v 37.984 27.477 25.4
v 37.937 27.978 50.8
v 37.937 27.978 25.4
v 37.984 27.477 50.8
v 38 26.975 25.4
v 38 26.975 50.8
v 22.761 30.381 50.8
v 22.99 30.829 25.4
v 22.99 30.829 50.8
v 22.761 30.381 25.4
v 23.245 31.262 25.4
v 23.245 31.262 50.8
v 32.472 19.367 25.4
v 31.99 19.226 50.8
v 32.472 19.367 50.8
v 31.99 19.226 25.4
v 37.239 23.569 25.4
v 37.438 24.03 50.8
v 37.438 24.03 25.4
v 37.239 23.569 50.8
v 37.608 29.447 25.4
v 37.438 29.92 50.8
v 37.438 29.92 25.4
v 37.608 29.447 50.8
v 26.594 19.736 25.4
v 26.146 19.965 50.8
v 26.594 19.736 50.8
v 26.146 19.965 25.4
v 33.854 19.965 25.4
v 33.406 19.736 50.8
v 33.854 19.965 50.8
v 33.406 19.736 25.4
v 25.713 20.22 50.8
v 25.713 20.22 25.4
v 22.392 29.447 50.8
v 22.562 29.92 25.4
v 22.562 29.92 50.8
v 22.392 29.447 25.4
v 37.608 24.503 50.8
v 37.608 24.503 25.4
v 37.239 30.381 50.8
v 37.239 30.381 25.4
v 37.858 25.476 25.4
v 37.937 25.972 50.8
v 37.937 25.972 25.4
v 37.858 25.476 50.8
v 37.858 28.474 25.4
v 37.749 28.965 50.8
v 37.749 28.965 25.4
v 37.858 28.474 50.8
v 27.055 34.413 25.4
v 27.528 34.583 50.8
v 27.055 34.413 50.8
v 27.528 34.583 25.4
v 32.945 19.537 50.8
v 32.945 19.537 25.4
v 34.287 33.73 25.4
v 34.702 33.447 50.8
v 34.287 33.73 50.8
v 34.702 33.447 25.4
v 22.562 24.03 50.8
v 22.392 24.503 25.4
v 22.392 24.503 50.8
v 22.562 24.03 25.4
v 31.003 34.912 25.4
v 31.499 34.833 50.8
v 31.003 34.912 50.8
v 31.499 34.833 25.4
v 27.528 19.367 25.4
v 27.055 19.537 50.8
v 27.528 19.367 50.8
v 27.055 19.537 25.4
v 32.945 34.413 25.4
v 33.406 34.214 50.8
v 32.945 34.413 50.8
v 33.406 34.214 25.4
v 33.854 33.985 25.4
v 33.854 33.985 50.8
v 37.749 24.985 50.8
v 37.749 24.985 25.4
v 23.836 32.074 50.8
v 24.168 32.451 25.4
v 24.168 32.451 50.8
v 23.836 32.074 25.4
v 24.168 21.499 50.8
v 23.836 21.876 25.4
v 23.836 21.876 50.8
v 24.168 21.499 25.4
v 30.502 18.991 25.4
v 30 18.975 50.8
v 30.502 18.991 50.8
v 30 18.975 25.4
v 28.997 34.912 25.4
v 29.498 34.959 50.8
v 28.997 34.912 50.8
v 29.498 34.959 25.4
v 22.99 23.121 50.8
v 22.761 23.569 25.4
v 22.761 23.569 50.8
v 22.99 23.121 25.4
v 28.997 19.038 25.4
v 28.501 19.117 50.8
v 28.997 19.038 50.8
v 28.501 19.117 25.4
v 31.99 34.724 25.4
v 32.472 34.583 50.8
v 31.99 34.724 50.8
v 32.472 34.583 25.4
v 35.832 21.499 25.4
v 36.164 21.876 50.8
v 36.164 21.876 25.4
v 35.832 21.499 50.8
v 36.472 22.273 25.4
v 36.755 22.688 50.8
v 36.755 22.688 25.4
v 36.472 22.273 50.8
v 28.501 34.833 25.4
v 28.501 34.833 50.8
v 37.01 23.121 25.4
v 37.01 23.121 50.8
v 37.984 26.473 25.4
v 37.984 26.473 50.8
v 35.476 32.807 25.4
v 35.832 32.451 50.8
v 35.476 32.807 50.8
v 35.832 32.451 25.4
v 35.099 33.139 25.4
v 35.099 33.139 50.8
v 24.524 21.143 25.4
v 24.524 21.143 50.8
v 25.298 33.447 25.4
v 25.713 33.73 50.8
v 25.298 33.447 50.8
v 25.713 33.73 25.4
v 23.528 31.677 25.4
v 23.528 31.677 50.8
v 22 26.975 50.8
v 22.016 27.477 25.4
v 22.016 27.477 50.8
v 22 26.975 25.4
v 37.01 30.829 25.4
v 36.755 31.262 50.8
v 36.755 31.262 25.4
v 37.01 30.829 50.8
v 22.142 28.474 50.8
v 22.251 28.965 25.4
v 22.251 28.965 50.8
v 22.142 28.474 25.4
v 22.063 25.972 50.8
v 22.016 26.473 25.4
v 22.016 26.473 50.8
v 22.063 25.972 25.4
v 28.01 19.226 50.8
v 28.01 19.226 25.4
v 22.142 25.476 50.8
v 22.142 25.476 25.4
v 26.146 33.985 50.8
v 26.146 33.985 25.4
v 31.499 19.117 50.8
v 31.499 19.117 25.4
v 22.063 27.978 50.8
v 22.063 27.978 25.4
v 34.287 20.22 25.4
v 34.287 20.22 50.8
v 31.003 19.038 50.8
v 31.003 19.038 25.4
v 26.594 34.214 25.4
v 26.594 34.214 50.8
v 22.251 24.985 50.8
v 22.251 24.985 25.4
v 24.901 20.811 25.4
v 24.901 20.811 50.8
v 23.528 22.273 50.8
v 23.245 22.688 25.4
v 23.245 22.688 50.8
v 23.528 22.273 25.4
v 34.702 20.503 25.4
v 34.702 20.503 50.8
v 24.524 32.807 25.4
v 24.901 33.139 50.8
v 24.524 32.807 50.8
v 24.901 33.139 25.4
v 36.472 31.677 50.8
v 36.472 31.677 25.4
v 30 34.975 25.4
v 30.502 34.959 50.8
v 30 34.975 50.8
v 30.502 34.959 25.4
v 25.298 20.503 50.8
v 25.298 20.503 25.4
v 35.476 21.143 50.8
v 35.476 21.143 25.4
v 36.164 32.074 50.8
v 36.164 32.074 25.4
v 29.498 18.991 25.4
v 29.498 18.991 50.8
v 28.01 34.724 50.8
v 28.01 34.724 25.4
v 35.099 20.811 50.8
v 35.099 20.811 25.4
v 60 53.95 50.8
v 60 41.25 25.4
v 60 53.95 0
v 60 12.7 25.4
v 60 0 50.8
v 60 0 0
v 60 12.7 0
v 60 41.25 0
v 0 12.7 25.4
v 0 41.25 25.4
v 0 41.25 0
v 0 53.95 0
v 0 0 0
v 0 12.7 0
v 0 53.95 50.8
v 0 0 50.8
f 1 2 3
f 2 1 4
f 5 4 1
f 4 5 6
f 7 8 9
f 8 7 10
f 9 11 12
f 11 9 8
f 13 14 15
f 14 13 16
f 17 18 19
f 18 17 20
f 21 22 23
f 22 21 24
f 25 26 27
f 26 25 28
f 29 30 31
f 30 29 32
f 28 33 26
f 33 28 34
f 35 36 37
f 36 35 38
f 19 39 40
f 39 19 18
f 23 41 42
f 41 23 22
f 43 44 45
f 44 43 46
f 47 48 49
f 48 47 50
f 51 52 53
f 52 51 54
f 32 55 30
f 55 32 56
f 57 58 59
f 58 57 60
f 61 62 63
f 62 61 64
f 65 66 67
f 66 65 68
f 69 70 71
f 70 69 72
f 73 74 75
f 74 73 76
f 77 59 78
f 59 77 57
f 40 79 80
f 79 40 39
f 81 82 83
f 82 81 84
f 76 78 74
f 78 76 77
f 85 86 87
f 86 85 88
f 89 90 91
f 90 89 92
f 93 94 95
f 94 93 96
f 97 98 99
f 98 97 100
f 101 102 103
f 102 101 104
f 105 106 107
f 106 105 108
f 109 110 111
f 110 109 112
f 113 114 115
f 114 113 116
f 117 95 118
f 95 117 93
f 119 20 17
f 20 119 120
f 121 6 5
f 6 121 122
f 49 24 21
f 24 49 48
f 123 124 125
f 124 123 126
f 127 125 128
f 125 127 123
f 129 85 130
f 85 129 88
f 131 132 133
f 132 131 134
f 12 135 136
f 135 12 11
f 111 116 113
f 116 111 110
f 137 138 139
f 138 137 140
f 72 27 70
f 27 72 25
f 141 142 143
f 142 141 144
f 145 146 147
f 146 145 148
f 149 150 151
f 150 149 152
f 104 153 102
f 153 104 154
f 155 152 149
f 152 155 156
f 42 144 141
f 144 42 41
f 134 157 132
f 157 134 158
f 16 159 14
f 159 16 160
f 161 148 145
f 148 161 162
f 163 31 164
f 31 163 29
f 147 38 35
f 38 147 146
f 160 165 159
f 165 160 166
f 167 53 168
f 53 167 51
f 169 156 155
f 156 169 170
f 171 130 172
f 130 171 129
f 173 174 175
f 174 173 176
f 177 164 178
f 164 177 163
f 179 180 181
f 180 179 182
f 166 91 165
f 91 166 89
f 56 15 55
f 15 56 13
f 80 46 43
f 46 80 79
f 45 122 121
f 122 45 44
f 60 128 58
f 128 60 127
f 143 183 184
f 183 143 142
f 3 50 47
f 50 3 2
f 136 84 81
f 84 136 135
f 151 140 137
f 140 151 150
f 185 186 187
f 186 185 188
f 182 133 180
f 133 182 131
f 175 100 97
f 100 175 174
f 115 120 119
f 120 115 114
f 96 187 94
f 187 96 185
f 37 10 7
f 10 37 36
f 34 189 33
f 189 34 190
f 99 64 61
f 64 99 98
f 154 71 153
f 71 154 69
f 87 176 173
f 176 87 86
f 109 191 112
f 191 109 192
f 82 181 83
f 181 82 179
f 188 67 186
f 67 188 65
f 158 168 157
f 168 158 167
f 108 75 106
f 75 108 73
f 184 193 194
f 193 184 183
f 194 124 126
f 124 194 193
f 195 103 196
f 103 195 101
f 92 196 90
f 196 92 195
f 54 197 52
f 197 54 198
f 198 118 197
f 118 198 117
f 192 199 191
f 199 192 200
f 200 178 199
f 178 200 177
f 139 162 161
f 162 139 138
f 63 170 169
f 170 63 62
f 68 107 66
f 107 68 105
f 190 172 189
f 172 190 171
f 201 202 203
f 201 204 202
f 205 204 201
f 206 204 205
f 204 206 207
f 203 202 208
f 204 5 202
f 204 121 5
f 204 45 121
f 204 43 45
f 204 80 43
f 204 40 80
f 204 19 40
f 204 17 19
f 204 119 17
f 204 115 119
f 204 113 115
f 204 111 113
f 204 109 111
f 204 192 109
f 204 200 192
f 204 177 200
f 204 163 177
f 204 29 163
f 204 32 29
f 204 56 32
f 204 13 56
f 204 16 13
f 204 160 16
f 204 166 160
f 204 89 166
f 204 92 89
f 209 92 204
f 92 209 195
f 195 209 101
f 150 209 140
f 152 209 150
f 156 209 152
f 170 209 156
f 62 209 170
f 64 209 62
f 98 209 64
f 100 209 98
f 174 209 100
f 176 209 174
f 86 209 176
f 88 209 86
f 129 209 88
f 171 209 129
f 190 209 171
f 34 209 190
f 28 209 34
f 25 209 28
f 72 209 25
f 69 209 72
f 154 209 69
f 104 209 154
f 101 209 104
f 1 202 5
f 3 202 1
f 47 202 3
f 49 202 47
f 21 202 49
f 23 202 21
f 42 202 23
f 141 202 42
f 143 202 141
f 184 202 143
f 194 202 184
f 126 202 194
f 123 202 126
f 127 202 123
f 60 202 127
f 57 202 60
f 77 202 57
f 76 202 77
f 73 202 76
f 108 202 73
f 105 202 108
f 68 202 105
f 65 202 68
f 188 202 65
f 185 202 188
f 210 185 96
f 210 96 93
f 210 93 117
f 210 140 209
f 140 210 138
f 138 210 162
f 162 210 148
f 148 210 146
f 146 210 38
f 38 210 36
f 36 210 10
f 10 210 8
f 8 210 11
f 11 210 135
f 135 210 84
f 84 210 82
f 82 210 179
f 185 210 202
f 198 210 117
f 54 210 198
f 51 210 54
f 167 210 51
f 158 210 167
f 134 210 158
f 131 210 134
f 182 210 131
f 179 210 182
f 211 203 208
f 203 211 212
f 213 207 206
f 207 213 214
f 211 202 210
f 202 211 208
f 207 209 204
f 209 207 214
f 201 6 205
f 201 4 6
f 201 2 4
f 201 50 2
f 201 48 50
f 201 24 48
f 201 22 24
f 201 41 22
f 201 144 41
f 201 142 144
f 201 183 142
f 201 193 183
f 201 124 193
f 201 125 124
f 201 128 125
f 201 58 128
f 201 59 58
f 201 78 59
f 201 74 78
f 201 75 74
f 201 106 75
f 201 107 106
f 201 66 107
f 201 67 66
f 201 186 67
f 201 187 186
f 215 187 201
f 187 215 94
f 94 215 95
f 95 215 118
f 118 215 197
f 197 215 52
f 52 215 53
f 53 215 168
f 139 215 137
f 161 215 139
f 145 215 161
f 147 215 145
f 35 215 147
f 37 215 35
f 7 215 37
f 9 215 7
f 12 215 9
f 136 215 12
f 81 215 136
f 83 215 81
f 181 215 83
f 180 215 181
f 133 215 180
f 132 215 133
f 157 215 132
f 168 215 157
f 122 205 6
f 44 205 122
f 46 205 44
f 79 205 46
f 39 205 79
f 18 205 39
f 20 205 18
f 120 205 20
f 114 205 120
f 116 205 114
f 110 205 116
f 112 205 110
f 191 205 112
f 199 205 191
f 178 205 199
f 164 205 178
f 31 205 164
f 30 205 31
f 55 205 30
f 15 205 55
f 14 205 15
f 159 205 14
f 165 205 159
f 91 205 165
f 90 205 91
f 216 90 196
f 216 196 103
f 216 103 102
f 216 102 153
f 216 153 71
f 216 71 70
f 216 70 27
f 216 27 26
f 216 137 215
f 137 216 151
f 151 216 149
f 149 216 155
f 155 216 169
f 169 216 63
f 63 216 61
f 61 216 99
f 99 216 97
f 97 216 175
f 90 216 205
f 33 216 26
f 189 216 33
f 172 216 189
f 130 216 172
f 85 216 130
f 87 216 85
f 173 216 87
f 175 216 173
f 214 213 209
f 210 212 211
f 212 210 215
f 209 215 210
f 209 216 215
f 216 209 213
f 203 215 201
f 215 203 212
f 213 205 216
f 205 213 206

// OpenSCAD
hole_r = (16 / 2);
shaft_r = (7 / 2);
//bit_head_length = 16;
bit_head_length = 60;

board_thickness = 28.55;
inch = 25.4;

guide_x = 60;
guide_y = board_thickness + inch;
guide_z = inch * 2;

cutout_x = guide_x * 2;
cutout_y = board_thickness;
cutout_z = inch;

$fn = 100;

difference() {
    cube([guide_x, guide_y, guide_z]);
    union() {
        translate([(guide_x / 2), (guide_y / 2), (inch - 0.01)]) {
            cylinder(h = bit_head_length, r = hole_r);
            translate([0, 0, bit_head_length]) {
                cylinder(h = (inch * 2), r = shaft_r);
            }
        }
        translate([0, (guide_y / 2), (inch / 2)]) {
            cube([cutout_x, cutout_y, cutout_z], center=true);
        }
    }
}
